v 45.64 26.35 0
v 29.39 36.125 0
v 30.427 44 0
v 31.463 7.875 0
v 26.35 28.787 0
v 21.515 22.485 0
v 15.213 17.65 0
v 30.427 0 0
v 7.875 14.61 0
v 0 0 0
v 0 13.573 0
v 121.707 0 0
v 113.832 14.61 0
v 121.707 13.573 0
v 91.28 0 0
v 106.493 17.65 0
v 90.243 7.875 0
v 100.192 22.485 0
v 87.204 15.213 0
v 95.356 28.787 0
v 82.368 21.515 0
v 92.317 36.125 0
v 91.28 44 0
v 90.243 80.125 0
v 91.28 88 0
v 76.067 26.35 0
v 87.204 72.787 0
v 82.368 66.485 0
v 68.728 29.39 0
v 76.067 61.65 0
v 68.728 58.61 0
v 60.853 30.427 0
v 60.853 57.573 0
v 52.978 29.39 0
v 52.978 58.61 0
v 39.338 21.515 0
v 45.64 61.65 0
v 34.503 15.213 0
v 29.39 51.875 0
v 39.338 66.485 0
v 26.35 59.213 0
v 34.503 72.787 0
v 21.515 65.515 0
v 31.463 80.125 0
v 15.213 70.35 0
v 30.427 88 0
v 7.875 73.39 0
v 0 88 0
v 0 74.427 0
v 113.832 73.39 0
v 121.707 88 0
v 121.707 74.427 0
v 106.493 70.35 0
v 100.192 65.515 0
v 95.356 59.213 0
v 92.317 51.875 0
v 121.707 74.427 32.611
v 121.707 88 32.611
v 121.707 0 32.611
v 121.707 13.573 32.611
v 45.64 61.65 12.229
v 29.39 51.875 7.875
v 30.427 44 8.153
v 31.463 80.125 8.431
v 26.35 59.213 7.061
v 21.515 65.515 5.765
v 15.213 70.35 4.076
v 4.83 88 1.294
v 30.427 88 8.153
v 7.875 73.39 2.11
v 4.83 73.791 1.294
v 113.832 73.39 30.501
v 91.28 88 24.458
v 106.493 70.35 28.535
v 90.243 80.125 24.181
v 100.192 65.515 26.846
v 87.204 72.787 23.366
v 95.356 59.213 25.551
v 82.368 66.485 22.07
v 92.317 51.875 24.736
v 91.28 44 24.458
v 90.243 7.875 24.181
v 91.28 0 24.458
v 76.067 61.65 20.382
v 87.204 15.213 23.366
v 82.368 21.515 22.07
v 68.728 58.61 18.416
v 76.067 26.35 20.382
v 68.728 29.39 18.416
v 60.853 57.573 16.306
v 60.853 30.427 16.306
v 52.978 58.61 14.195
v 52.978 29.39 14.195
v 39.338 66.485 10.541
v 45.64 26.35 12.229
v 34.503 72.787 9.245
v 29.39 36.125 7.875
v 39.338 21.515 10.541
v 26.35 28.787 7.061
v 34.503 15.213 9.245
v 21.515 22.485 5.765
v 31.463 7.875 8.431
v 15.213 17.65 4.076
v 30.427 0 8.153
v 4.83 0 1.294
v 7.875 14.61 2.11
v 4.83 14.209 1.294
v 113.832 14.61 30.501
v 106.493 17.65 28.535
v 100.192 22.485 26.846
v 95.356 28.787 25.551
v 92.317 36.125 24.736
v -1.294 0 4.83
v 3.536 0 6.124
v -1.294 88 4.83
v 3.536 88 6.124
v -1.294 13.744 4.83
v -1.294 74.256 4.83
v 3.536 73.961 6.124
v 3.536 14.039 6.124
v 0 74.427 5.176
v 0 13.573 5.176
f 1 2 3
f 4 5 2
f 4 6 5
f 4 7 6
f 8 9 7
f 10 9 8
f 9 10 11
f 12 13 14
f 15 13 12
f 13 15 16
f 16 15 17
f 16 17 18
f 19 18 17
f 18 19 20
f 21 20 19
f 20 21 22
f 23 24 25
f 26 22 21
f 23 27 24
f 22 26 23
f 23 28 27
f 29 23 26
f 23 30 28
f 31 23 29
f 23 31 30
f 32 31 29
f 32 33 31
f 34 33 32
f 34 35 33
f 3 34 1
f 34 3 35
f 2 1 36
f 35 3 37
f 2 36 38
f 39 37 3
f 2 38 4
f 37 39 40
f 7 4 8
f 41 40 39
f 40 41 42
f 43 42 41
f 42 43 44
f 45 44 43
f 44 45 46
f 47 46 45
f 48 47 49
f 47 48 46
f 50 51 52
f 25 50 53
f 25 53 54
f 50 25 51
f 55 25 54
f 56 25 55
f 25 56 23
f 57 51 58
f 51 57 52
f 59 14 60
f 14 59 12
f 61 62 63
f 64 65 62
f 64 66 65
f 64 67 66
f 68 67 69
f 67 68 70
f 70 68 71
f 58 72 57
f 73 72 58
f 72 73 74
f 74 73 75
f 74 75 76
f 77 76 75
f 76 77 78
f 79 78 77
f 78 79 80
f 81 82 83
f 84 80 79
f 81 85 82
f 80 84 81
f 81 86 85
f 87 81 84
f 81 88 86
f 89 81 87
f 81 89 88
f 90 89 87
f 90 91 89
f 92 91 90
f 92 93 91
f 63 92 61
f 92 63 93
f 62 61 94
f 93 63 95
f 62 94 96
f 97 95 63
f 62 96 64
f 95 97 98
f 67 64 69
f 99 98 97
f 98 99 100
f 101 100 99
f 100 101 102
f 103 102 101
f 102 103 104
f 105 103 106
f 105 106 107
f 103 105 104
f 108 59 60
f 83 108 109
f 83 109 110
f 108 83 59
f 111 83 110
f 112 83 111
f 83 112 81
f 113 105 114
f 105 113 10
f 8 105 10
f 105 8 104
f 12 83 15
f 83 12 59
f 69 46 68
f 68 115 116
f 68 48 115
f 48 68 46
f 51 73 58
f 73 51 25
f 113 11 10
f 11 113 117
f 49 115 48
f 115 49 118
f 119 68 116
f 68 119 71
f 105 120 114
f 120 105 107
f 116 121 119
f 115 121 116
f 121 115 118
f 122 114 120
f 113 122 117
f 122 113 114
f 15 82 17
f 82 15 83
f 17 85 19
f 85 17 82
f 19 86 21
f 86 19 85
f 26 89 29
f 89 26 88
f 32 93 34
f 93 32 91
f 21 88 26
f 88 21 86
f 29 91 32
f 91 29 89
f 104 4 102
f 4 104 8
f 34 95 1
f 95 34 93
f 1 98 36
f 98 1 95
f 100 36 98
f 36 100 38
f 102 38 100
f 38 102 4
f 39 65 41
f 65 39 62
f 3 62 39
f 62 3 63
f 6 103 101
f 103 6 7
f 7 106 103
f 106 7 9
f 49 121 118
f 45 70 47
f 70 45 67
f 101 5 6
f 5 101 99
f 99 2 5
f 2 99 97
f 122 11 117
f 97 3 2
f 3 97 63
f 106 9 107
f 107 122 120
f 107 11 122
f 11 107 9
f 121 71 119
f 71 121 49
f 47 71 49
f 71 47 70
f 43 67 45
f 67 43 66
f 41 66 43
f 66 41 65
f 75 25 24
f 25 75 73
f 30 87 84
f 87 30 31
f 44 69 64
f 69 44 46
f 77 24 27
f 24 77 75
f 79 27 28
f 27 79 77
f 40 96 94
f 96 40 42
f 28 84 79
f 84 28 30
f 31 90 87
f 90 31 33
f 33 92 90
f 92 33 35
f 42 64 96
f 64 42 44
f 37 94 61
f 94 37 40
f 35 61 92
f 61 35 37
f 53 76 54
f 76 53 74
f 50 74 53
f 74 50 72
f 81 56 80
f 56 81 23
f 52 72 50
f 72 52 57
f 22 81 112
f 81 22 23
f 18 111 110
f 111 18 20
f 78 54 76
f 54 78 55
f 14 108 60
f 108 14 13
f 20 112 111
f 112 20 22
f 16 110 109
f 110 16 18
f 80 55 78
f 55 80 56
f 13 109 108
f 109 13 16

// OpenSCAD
//height of the surface the keyboard half will rest on
height = 88;

// width of the surface the keyboard will rest on
width = 121;

//angle of inclination
angle = 15; // [0:90]

// minkowski radius. increase to increase rounding
mink_r = 0;

// side length of cube at the bottom of the tent to hold in the keyboards
support_board_thickness = 5;

// how big the holes are. higher numbers = smaller holes. 2 = 1/2 the size of the sides
hole_size_factor = 2;

// facet number for cylinders and spheres. decrease to decrease rounded edges and compilation time
$fn=24;

// length is now x, width is y, height is still z
module prism(l, w, h){
  polyhedron(
    points=[[0,0,0], [0,w,0], [l,w,0], [l,0,0], [l,0,h], [l,w,h]],
    faces=[[0,1,2,3],[5,4,3,2],[0,4,5,1],[0,3,4],[5,2,1]]
  );
}


//calculated variables

// height is the only thing that needs adjustment, since the supoport bar
// at the bottom of the print actually extends, counteracting the extension
// of the length at the other side. that does make the support bar longer
// than advertised, but eh

real_height = height - mink_r * 2;




module tent(angle){
  hypotenuse = width + support_board_thickness;
  opposite = sin(angle) * hypotenuse;
  adjacent = cos(angle) * hypotenuse;

  minkowski(){
    difference(){
      union(){
        prism(adjacent, real_height, opposite);
        rotate([0, -angle, 0]) cube([support_board_thickness, real_height, support_board_thickness]);
      }
      holes(adjacent, real_height);
      // bottom board. if you want more height in your design you can enable this
      /* translate([0, 0, -10]) cube([adjacent, real_height, 10]); */
    }
    minkowski_shape(angle);
  }
}

// special cylinder with a tilted top that exactly matches the angle of the support
module minkowski_shape(angle=15){
  hull() {
    cylinder(r=mink_r, h=.001);
    rotate([0, -angle, 0]) translate([0, 0, mink_r]) cylinder(r= mink_r, h=.001);
  }
}

module holes(length, real_height){
  $fn=24;
  translate ([length / 2, 0, 0]) cylinder(d=length / hole_size_factor, h=100);
  translate([0, real_height / 2, 0]) cylinder(d=length / hole_size_factor, h=100);
  translate([length / 2, real_height, 0]) cylinder(d=length / hole_size_factor, h=100);
  translate([length, real_height / 2, 0]) cylinder(d=length / hole_size_factor, h=100);
}

/* minkowski_shape(); */
tent(angle);
